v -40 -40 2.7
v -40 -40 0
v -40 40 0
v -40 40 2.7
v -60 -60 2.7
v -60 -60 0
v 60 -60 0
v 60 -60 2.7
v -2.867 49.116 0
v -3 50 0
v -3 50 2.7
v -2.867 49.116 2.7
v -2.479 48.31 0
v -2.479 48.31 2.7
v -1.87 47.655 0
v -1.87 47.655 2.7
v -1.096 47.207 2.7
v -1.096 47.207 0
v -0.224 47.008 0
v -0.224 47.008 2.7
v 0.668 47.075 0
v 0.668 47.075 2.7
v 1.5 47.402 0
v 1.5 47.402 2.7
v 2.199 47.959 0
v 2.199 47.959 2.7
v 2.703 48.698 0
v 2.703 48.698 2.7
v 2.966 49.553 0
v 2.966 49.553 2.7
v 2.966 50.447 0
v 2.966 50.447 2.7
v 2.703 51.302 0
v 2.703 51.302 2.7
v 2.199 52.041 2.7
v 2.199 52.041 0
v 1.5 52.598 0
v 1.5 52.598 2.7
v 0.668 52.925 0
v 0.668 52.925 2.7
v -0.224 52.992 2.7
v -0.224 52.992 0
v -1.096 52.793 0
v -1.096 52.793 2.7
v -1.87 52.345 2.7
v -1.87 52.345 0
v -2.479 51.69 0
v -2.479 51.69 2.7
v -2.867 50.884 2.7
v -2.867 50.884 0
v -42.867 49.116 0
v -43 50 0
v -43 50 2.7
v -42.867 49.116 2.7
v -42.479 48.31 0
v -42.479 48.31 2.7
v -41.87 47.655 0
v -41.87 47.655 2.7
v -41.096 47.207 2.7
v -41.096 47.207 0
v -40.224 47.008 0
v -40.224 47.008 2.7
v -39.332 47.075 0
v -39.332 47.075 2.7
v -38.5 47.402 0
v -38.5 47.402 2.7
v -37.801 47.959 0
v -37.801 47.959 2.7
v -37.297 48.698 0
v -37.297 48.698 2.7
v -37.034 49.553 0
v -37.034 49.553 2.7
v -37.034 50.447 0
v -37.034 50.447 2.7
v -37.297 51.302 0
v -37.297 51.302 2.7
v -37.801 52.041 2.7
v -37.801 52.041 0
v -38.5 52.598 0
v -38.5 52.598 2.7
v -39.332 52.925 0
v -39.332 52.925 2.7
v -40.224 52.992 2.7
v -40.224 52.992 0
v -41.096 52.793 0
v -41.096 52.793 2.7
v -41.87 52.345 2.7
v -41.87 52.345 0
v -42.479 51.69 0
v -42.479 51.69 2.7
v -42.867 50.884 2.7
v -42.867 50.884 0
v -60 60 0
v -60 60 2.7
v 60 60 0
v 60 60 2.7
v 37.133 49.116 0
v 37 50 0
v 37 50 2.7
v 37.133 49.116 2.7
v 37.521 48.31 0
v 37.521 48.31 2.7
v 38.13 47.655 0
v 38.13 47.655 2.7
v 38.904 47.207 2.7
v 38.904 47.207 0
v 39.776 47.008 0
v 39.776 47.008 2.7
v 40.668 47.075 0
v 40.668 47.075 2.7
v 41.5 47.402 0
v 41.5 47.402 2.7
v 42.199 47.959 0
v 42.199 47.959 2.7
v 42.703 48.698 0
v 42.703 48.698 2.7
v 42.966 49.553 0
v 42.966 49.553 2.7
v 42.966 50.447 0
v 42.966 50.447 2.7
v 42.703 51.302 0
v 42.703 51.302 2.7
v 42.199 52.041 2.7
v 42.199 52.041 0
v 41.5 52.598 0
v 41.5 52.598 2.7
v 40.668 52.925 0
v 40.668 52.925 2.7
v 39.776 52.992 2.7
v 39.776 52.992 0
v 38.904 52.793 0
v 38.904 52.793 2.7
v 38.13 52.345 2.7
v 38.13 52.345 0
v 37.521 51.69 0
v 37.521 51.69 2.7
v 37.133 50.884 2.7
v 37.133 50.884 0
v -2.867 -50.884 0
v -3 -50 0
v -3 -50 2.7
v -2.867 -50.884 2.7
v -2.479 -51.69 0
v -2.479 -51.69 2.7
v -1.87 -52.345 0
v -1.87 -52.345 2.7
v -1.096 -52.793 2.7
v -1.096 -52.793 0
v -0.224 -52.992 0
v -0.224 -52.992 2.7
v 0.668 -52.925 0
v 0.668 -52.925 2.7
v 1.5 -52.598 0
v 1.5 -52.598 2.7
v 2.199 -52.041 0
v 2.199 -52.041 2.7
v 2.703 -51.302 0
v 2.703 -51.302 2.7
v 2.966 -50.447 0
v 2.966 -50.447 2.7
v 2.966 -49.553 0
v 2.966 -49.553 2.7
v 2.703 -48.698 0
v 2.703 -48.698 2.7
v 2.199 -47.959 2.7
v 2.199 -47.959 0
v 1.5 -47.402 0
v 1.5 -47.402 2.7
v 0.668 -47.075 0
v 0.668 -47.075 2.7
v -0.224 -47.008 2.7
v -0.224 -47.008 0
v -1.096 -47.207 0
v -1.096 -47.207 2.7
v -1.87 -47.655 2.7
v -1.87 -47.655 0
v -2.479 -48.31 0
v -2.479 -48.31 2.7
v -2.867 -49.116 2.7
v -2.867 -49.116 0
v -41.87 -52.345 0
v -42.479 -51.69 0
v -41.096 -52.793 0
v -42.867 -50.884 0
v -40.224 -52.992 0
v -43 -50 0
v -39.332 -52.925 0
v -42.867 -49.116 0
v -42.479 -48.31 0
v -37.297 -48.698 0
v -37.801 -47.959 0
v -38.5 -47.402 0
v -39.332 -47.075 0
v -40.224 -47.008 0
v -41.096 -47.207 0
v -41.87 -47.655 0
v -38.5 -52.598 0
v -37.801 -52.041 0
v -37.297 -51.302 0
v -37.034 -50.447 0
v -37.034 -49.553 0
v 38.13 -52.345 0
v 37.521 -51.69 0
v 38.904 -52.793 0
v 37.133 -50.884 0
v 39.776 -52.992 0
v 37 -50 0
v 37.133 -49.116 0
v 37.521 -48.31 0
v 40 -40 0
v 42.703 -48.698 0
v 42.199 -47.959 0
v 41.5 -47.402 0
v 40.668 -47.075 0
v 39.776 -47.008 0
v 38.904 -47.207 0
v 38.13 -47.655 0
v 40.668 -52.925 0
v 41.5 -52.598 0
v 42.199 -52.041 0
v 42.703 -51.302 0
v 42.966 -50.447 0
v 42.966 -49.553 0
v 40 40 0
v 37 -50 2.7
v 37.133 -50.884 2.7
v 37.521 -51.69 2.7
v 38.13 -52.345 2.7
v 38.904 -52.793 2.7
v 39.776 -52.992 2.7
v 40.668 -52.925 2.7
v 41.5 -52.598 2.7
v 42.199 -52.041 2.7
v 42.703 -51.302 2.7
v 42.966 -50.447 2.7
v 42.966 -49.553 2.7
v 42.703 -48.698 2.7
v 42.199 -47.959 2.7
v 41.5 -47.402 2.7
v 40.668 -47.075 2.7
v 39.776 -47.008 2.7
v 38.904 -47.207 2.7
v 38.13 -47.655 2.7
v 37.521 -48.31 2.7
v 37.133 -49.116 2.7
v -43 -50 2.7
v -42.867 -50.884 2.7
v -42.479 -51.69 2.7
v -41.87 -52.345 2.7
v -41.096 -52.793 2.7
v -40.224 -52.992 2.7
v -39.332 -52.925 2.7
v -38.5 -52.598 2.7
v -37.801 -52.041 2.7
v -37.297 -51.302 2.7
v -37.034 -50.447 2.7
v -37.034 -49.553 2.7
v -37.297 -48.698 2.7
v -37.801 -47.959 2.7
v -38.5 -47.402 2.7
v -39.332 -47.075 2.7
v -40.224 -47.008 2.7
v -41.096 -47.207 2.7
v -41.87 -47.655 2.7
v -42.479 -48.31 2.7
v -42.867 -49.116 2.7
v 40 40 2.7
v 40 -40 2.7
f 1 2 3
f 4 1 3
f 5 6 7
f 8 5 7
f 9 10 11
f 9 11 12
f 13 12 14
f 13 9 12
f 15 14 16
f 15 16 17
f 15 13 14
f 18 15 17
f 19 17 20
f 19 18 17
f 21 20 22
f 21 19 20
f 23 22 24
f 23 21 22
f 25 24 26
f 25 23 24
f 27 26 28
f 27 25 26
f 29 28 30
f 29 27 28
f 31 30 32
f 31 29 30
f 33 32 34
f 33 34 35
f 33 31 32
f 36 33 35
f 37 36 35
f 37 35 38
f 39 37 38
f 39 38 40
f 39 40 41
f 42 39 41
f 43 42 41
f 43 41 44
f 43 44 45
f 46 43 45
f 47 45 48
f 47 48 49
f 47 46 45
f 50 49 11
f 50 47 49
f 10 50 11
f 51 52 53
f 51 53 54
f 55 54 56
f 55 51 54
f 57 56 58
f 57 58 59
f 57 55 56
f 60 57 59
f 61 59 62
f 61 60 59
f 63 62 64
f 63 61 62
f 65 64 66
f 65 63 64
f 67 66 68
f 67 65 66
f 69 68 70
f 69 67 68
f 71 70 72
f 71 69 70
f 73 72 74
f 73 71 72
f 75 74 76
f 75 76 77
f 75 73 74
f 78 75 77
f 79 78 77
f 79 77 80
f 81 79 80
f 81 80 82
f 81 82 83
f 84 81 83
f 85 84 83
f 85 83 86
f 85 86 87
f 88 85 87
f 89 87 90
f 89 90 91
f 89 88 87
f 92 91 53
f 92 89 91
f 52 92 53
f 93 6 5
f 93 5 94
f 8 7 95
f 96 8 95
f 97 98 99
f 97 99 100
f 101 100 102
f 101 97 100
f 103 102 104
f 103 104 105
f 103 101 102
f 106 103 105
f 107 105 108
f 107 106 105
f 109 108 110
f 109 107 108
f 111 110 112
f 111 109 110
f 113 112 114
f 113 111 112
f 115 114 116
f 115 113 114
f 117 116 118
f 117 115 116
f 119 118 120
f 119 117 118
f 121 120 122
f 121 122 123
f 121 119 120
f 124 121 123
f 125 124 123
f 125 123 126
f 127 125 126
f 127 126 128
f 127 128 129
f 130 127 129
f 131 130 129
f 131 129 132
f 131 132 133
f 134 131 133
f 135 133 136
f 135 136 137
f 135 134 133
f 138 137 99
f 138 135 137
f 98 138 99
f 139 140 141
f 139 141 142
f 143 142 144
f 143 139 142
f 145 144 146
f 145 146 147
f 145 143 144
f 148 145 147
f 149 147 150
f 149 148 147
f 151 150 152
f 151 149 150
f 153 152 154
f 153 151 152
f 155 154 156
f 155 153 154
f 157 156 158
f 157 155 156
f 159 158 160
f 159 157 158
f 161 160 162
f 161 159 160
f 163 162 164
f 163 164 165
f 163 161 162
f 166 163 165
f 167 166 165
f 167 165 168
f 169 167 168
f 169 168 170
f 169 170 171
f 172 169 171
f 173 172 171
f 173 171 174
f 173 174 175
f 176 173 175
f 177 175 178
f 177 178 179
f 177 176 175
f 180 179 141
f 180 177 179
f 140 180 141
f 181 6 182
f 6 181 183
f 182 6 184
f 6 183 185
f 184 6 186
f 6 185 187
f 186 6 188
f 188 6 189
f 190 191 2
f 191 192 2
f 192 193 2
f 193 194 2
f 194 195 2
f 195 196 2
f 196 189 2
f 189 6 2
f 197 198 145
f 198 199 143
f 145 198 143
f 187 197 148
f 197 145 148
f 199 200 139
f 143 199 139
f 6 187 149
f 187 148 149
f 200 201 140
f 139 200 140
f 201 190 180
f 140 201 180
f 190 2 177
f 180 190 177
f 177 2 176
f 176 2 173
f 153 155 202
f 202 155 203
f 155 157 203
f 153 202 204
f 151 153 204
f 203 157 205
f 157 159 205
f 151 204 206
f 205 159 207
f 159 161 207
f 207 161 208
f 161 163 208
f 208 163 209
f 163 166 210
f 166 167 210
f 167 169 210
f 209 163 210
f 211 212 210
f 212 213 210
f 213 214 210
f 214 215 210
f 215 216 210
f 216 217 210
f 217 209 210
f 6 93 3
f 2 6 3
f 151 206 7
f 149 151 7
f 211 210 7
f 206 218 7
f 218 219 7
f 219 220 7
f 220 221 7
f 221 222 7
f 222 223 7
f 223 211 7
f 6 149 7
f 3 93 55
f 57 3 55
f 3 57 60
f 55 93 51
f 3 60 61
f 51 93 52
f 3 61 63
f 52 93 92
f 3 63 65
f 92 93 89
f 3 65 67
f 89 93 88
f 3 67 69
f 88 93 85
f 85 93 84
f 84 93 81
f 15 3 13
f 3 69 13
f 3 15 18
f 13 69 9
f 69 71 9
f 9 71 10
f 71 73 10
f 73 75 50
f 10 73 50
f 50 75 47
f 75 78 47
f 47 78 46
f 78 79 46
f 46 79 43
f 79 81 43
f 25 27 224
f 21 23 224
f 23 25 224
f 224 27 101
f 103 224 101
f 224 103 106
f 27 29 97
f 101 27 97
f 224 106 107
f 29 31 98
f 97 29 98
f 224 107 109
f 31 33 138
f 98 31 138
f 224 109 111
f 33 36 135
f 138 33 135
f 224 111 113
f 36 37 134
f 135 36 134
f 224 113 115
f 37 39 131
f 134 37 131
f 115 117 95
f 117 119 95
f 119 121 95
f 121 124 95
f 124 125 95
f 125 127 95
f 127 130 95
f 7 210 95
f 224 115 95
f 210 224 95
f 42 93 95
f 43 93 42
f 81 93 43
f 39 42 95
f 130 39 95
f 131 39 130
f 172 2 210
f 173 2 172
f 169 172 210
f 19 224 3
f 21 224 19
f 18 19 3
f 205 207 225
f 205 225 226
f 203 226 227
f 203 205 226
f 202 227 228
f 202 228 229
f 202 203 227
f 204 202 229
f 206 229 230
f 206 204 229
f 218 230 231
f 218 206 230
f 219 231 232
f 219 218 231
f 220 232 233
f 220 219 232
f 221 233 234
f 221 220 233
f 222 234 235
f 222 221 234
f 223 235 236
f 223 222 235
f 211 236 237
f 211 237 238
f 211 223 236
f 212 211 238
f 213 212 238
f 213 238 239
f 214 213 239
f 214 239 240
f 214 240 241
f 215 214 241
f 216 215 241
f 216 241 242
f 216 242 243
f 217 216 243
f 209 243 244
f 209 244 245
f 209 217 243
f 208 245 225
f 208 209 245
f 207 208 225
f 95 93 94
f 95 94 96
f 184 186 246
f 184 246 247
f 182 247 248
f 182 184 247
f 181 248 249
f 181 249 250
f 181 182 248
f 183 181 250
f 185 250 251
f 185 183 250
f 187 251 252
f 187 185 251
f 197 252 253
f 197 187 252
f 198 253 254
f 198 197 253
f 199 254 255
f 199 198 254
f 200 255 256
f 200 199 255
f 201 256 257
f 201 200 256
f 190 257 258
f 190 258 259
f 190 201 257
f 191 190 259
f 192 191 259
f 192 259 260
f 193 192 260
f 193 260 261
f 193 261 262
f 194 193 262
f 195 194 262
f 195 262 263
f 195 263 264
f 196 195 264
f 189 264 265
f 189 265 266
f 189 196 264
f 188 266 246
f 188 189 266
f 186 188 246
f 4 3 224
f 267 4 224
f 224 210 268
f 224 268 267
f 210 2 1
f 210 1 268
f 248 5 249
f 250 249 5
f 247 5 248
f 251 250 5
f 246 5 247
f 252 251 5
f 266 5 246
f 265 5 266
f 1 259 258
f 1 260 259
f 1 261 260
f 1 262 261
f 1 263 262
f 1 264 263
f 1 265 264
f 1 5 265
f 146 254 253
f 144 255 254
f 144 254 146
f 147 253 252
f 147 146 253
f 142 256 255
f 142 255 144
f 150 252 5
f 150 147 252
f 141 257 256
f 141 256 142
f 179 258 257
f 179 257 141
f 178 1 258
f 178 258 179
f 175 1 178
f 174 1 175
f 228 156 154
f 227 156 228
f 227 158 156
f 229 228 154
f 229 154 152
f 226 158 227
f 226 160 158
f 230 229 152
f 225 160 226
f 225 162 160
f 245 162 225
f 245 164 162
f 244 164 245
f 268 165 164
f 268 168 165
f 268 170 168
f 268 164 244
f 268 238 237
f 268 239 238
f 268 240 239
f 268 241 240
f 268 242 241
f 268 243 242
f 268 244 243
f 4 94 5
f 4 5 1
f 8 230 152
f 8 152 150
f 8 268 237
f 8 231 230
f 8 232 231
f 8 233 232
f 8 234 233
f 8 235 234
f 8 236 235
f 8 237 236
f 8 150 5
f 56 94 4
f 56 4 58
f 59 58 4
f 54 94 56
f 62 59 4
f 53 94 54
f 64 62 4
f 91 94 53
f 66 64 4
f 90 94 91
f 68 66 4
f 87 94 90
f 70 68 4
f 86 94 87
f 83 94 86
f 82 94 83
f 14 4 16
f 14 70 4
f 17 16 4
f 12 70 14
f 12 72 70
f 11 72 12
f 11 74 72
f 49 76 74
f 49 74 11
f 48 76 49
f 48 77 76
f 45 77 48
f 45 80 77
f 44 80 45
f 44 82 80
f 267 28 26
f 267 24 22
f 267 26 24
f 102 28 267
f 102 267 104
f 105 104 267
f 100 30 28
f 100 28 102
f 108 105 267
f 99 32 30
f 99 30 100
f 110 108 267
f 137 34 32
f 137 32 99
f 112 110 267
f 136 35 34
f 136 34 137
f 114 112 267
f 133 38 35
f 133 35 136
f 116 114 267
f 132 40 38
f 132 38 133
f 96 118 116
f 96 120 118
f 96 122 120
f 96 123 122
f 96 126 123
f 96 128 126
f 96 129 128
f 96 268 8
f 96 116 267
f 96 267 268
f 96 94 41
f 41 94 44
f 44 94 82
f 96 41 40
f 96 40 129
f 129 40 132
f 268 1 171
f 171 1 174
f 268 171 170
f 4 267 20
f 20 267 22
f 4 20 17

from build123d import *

# Parameters (mm, degrees)
CROQUIS1_W              = 120
CROQUIS1_H              = 120
CROQUIS1_R              = 3
CROQUIS1_W_2            = 80
CROQUIS1_H_2            = 80
SALIENTE_EXTRUIR1_DEPTH = 2.7


with BuildPart() as part:
    # Croquis1 → Saliente-Extruir1 (new body)
    with BuildSketch(Plane.XY):
        Rectangle(CROQUIS1_W, CROQUIS1_H)
        with Locations(Location((-40, 50, 0), (0, 0, 180))):
            Circle(CROQUIS1_R, mode=Mode.SUBTRACT)
        with Locations(Location((0, 50, 0), (0, 0, 180))):
            Circle(CROQUIS1_R, mode=Mode.SUBTRACT)
        with Locations(Location((40, 50, 0), (0, 0, 180))):
            Circle(CROQUIS1_R, mode=Mode.SUBTRACT)
        with Locations(Location((-40, -50, 0), (0, 0, 180))):
            Circle(CROQUIS1_R, mode=Mode.SUBTRACT)
        with Locations(Location((0, -50, 0), (0, 0, 180))):
            Circle(CROQUIS1_R, mode=Mode.SUBTRACT)
        with Locations(Location((40, -50, 0), (0, 0, 180))):
            Circle(CROQUIS1_R, mode=Mode.SUBTRACT)
        Rectangle(CROQUIS1_W_2, CROQUIS1_H_2, mode=Mode.SUBTRACT)
    extrude(amount=SALIENTE_EXTRUIR1_DEPTH)


solid = part.part
